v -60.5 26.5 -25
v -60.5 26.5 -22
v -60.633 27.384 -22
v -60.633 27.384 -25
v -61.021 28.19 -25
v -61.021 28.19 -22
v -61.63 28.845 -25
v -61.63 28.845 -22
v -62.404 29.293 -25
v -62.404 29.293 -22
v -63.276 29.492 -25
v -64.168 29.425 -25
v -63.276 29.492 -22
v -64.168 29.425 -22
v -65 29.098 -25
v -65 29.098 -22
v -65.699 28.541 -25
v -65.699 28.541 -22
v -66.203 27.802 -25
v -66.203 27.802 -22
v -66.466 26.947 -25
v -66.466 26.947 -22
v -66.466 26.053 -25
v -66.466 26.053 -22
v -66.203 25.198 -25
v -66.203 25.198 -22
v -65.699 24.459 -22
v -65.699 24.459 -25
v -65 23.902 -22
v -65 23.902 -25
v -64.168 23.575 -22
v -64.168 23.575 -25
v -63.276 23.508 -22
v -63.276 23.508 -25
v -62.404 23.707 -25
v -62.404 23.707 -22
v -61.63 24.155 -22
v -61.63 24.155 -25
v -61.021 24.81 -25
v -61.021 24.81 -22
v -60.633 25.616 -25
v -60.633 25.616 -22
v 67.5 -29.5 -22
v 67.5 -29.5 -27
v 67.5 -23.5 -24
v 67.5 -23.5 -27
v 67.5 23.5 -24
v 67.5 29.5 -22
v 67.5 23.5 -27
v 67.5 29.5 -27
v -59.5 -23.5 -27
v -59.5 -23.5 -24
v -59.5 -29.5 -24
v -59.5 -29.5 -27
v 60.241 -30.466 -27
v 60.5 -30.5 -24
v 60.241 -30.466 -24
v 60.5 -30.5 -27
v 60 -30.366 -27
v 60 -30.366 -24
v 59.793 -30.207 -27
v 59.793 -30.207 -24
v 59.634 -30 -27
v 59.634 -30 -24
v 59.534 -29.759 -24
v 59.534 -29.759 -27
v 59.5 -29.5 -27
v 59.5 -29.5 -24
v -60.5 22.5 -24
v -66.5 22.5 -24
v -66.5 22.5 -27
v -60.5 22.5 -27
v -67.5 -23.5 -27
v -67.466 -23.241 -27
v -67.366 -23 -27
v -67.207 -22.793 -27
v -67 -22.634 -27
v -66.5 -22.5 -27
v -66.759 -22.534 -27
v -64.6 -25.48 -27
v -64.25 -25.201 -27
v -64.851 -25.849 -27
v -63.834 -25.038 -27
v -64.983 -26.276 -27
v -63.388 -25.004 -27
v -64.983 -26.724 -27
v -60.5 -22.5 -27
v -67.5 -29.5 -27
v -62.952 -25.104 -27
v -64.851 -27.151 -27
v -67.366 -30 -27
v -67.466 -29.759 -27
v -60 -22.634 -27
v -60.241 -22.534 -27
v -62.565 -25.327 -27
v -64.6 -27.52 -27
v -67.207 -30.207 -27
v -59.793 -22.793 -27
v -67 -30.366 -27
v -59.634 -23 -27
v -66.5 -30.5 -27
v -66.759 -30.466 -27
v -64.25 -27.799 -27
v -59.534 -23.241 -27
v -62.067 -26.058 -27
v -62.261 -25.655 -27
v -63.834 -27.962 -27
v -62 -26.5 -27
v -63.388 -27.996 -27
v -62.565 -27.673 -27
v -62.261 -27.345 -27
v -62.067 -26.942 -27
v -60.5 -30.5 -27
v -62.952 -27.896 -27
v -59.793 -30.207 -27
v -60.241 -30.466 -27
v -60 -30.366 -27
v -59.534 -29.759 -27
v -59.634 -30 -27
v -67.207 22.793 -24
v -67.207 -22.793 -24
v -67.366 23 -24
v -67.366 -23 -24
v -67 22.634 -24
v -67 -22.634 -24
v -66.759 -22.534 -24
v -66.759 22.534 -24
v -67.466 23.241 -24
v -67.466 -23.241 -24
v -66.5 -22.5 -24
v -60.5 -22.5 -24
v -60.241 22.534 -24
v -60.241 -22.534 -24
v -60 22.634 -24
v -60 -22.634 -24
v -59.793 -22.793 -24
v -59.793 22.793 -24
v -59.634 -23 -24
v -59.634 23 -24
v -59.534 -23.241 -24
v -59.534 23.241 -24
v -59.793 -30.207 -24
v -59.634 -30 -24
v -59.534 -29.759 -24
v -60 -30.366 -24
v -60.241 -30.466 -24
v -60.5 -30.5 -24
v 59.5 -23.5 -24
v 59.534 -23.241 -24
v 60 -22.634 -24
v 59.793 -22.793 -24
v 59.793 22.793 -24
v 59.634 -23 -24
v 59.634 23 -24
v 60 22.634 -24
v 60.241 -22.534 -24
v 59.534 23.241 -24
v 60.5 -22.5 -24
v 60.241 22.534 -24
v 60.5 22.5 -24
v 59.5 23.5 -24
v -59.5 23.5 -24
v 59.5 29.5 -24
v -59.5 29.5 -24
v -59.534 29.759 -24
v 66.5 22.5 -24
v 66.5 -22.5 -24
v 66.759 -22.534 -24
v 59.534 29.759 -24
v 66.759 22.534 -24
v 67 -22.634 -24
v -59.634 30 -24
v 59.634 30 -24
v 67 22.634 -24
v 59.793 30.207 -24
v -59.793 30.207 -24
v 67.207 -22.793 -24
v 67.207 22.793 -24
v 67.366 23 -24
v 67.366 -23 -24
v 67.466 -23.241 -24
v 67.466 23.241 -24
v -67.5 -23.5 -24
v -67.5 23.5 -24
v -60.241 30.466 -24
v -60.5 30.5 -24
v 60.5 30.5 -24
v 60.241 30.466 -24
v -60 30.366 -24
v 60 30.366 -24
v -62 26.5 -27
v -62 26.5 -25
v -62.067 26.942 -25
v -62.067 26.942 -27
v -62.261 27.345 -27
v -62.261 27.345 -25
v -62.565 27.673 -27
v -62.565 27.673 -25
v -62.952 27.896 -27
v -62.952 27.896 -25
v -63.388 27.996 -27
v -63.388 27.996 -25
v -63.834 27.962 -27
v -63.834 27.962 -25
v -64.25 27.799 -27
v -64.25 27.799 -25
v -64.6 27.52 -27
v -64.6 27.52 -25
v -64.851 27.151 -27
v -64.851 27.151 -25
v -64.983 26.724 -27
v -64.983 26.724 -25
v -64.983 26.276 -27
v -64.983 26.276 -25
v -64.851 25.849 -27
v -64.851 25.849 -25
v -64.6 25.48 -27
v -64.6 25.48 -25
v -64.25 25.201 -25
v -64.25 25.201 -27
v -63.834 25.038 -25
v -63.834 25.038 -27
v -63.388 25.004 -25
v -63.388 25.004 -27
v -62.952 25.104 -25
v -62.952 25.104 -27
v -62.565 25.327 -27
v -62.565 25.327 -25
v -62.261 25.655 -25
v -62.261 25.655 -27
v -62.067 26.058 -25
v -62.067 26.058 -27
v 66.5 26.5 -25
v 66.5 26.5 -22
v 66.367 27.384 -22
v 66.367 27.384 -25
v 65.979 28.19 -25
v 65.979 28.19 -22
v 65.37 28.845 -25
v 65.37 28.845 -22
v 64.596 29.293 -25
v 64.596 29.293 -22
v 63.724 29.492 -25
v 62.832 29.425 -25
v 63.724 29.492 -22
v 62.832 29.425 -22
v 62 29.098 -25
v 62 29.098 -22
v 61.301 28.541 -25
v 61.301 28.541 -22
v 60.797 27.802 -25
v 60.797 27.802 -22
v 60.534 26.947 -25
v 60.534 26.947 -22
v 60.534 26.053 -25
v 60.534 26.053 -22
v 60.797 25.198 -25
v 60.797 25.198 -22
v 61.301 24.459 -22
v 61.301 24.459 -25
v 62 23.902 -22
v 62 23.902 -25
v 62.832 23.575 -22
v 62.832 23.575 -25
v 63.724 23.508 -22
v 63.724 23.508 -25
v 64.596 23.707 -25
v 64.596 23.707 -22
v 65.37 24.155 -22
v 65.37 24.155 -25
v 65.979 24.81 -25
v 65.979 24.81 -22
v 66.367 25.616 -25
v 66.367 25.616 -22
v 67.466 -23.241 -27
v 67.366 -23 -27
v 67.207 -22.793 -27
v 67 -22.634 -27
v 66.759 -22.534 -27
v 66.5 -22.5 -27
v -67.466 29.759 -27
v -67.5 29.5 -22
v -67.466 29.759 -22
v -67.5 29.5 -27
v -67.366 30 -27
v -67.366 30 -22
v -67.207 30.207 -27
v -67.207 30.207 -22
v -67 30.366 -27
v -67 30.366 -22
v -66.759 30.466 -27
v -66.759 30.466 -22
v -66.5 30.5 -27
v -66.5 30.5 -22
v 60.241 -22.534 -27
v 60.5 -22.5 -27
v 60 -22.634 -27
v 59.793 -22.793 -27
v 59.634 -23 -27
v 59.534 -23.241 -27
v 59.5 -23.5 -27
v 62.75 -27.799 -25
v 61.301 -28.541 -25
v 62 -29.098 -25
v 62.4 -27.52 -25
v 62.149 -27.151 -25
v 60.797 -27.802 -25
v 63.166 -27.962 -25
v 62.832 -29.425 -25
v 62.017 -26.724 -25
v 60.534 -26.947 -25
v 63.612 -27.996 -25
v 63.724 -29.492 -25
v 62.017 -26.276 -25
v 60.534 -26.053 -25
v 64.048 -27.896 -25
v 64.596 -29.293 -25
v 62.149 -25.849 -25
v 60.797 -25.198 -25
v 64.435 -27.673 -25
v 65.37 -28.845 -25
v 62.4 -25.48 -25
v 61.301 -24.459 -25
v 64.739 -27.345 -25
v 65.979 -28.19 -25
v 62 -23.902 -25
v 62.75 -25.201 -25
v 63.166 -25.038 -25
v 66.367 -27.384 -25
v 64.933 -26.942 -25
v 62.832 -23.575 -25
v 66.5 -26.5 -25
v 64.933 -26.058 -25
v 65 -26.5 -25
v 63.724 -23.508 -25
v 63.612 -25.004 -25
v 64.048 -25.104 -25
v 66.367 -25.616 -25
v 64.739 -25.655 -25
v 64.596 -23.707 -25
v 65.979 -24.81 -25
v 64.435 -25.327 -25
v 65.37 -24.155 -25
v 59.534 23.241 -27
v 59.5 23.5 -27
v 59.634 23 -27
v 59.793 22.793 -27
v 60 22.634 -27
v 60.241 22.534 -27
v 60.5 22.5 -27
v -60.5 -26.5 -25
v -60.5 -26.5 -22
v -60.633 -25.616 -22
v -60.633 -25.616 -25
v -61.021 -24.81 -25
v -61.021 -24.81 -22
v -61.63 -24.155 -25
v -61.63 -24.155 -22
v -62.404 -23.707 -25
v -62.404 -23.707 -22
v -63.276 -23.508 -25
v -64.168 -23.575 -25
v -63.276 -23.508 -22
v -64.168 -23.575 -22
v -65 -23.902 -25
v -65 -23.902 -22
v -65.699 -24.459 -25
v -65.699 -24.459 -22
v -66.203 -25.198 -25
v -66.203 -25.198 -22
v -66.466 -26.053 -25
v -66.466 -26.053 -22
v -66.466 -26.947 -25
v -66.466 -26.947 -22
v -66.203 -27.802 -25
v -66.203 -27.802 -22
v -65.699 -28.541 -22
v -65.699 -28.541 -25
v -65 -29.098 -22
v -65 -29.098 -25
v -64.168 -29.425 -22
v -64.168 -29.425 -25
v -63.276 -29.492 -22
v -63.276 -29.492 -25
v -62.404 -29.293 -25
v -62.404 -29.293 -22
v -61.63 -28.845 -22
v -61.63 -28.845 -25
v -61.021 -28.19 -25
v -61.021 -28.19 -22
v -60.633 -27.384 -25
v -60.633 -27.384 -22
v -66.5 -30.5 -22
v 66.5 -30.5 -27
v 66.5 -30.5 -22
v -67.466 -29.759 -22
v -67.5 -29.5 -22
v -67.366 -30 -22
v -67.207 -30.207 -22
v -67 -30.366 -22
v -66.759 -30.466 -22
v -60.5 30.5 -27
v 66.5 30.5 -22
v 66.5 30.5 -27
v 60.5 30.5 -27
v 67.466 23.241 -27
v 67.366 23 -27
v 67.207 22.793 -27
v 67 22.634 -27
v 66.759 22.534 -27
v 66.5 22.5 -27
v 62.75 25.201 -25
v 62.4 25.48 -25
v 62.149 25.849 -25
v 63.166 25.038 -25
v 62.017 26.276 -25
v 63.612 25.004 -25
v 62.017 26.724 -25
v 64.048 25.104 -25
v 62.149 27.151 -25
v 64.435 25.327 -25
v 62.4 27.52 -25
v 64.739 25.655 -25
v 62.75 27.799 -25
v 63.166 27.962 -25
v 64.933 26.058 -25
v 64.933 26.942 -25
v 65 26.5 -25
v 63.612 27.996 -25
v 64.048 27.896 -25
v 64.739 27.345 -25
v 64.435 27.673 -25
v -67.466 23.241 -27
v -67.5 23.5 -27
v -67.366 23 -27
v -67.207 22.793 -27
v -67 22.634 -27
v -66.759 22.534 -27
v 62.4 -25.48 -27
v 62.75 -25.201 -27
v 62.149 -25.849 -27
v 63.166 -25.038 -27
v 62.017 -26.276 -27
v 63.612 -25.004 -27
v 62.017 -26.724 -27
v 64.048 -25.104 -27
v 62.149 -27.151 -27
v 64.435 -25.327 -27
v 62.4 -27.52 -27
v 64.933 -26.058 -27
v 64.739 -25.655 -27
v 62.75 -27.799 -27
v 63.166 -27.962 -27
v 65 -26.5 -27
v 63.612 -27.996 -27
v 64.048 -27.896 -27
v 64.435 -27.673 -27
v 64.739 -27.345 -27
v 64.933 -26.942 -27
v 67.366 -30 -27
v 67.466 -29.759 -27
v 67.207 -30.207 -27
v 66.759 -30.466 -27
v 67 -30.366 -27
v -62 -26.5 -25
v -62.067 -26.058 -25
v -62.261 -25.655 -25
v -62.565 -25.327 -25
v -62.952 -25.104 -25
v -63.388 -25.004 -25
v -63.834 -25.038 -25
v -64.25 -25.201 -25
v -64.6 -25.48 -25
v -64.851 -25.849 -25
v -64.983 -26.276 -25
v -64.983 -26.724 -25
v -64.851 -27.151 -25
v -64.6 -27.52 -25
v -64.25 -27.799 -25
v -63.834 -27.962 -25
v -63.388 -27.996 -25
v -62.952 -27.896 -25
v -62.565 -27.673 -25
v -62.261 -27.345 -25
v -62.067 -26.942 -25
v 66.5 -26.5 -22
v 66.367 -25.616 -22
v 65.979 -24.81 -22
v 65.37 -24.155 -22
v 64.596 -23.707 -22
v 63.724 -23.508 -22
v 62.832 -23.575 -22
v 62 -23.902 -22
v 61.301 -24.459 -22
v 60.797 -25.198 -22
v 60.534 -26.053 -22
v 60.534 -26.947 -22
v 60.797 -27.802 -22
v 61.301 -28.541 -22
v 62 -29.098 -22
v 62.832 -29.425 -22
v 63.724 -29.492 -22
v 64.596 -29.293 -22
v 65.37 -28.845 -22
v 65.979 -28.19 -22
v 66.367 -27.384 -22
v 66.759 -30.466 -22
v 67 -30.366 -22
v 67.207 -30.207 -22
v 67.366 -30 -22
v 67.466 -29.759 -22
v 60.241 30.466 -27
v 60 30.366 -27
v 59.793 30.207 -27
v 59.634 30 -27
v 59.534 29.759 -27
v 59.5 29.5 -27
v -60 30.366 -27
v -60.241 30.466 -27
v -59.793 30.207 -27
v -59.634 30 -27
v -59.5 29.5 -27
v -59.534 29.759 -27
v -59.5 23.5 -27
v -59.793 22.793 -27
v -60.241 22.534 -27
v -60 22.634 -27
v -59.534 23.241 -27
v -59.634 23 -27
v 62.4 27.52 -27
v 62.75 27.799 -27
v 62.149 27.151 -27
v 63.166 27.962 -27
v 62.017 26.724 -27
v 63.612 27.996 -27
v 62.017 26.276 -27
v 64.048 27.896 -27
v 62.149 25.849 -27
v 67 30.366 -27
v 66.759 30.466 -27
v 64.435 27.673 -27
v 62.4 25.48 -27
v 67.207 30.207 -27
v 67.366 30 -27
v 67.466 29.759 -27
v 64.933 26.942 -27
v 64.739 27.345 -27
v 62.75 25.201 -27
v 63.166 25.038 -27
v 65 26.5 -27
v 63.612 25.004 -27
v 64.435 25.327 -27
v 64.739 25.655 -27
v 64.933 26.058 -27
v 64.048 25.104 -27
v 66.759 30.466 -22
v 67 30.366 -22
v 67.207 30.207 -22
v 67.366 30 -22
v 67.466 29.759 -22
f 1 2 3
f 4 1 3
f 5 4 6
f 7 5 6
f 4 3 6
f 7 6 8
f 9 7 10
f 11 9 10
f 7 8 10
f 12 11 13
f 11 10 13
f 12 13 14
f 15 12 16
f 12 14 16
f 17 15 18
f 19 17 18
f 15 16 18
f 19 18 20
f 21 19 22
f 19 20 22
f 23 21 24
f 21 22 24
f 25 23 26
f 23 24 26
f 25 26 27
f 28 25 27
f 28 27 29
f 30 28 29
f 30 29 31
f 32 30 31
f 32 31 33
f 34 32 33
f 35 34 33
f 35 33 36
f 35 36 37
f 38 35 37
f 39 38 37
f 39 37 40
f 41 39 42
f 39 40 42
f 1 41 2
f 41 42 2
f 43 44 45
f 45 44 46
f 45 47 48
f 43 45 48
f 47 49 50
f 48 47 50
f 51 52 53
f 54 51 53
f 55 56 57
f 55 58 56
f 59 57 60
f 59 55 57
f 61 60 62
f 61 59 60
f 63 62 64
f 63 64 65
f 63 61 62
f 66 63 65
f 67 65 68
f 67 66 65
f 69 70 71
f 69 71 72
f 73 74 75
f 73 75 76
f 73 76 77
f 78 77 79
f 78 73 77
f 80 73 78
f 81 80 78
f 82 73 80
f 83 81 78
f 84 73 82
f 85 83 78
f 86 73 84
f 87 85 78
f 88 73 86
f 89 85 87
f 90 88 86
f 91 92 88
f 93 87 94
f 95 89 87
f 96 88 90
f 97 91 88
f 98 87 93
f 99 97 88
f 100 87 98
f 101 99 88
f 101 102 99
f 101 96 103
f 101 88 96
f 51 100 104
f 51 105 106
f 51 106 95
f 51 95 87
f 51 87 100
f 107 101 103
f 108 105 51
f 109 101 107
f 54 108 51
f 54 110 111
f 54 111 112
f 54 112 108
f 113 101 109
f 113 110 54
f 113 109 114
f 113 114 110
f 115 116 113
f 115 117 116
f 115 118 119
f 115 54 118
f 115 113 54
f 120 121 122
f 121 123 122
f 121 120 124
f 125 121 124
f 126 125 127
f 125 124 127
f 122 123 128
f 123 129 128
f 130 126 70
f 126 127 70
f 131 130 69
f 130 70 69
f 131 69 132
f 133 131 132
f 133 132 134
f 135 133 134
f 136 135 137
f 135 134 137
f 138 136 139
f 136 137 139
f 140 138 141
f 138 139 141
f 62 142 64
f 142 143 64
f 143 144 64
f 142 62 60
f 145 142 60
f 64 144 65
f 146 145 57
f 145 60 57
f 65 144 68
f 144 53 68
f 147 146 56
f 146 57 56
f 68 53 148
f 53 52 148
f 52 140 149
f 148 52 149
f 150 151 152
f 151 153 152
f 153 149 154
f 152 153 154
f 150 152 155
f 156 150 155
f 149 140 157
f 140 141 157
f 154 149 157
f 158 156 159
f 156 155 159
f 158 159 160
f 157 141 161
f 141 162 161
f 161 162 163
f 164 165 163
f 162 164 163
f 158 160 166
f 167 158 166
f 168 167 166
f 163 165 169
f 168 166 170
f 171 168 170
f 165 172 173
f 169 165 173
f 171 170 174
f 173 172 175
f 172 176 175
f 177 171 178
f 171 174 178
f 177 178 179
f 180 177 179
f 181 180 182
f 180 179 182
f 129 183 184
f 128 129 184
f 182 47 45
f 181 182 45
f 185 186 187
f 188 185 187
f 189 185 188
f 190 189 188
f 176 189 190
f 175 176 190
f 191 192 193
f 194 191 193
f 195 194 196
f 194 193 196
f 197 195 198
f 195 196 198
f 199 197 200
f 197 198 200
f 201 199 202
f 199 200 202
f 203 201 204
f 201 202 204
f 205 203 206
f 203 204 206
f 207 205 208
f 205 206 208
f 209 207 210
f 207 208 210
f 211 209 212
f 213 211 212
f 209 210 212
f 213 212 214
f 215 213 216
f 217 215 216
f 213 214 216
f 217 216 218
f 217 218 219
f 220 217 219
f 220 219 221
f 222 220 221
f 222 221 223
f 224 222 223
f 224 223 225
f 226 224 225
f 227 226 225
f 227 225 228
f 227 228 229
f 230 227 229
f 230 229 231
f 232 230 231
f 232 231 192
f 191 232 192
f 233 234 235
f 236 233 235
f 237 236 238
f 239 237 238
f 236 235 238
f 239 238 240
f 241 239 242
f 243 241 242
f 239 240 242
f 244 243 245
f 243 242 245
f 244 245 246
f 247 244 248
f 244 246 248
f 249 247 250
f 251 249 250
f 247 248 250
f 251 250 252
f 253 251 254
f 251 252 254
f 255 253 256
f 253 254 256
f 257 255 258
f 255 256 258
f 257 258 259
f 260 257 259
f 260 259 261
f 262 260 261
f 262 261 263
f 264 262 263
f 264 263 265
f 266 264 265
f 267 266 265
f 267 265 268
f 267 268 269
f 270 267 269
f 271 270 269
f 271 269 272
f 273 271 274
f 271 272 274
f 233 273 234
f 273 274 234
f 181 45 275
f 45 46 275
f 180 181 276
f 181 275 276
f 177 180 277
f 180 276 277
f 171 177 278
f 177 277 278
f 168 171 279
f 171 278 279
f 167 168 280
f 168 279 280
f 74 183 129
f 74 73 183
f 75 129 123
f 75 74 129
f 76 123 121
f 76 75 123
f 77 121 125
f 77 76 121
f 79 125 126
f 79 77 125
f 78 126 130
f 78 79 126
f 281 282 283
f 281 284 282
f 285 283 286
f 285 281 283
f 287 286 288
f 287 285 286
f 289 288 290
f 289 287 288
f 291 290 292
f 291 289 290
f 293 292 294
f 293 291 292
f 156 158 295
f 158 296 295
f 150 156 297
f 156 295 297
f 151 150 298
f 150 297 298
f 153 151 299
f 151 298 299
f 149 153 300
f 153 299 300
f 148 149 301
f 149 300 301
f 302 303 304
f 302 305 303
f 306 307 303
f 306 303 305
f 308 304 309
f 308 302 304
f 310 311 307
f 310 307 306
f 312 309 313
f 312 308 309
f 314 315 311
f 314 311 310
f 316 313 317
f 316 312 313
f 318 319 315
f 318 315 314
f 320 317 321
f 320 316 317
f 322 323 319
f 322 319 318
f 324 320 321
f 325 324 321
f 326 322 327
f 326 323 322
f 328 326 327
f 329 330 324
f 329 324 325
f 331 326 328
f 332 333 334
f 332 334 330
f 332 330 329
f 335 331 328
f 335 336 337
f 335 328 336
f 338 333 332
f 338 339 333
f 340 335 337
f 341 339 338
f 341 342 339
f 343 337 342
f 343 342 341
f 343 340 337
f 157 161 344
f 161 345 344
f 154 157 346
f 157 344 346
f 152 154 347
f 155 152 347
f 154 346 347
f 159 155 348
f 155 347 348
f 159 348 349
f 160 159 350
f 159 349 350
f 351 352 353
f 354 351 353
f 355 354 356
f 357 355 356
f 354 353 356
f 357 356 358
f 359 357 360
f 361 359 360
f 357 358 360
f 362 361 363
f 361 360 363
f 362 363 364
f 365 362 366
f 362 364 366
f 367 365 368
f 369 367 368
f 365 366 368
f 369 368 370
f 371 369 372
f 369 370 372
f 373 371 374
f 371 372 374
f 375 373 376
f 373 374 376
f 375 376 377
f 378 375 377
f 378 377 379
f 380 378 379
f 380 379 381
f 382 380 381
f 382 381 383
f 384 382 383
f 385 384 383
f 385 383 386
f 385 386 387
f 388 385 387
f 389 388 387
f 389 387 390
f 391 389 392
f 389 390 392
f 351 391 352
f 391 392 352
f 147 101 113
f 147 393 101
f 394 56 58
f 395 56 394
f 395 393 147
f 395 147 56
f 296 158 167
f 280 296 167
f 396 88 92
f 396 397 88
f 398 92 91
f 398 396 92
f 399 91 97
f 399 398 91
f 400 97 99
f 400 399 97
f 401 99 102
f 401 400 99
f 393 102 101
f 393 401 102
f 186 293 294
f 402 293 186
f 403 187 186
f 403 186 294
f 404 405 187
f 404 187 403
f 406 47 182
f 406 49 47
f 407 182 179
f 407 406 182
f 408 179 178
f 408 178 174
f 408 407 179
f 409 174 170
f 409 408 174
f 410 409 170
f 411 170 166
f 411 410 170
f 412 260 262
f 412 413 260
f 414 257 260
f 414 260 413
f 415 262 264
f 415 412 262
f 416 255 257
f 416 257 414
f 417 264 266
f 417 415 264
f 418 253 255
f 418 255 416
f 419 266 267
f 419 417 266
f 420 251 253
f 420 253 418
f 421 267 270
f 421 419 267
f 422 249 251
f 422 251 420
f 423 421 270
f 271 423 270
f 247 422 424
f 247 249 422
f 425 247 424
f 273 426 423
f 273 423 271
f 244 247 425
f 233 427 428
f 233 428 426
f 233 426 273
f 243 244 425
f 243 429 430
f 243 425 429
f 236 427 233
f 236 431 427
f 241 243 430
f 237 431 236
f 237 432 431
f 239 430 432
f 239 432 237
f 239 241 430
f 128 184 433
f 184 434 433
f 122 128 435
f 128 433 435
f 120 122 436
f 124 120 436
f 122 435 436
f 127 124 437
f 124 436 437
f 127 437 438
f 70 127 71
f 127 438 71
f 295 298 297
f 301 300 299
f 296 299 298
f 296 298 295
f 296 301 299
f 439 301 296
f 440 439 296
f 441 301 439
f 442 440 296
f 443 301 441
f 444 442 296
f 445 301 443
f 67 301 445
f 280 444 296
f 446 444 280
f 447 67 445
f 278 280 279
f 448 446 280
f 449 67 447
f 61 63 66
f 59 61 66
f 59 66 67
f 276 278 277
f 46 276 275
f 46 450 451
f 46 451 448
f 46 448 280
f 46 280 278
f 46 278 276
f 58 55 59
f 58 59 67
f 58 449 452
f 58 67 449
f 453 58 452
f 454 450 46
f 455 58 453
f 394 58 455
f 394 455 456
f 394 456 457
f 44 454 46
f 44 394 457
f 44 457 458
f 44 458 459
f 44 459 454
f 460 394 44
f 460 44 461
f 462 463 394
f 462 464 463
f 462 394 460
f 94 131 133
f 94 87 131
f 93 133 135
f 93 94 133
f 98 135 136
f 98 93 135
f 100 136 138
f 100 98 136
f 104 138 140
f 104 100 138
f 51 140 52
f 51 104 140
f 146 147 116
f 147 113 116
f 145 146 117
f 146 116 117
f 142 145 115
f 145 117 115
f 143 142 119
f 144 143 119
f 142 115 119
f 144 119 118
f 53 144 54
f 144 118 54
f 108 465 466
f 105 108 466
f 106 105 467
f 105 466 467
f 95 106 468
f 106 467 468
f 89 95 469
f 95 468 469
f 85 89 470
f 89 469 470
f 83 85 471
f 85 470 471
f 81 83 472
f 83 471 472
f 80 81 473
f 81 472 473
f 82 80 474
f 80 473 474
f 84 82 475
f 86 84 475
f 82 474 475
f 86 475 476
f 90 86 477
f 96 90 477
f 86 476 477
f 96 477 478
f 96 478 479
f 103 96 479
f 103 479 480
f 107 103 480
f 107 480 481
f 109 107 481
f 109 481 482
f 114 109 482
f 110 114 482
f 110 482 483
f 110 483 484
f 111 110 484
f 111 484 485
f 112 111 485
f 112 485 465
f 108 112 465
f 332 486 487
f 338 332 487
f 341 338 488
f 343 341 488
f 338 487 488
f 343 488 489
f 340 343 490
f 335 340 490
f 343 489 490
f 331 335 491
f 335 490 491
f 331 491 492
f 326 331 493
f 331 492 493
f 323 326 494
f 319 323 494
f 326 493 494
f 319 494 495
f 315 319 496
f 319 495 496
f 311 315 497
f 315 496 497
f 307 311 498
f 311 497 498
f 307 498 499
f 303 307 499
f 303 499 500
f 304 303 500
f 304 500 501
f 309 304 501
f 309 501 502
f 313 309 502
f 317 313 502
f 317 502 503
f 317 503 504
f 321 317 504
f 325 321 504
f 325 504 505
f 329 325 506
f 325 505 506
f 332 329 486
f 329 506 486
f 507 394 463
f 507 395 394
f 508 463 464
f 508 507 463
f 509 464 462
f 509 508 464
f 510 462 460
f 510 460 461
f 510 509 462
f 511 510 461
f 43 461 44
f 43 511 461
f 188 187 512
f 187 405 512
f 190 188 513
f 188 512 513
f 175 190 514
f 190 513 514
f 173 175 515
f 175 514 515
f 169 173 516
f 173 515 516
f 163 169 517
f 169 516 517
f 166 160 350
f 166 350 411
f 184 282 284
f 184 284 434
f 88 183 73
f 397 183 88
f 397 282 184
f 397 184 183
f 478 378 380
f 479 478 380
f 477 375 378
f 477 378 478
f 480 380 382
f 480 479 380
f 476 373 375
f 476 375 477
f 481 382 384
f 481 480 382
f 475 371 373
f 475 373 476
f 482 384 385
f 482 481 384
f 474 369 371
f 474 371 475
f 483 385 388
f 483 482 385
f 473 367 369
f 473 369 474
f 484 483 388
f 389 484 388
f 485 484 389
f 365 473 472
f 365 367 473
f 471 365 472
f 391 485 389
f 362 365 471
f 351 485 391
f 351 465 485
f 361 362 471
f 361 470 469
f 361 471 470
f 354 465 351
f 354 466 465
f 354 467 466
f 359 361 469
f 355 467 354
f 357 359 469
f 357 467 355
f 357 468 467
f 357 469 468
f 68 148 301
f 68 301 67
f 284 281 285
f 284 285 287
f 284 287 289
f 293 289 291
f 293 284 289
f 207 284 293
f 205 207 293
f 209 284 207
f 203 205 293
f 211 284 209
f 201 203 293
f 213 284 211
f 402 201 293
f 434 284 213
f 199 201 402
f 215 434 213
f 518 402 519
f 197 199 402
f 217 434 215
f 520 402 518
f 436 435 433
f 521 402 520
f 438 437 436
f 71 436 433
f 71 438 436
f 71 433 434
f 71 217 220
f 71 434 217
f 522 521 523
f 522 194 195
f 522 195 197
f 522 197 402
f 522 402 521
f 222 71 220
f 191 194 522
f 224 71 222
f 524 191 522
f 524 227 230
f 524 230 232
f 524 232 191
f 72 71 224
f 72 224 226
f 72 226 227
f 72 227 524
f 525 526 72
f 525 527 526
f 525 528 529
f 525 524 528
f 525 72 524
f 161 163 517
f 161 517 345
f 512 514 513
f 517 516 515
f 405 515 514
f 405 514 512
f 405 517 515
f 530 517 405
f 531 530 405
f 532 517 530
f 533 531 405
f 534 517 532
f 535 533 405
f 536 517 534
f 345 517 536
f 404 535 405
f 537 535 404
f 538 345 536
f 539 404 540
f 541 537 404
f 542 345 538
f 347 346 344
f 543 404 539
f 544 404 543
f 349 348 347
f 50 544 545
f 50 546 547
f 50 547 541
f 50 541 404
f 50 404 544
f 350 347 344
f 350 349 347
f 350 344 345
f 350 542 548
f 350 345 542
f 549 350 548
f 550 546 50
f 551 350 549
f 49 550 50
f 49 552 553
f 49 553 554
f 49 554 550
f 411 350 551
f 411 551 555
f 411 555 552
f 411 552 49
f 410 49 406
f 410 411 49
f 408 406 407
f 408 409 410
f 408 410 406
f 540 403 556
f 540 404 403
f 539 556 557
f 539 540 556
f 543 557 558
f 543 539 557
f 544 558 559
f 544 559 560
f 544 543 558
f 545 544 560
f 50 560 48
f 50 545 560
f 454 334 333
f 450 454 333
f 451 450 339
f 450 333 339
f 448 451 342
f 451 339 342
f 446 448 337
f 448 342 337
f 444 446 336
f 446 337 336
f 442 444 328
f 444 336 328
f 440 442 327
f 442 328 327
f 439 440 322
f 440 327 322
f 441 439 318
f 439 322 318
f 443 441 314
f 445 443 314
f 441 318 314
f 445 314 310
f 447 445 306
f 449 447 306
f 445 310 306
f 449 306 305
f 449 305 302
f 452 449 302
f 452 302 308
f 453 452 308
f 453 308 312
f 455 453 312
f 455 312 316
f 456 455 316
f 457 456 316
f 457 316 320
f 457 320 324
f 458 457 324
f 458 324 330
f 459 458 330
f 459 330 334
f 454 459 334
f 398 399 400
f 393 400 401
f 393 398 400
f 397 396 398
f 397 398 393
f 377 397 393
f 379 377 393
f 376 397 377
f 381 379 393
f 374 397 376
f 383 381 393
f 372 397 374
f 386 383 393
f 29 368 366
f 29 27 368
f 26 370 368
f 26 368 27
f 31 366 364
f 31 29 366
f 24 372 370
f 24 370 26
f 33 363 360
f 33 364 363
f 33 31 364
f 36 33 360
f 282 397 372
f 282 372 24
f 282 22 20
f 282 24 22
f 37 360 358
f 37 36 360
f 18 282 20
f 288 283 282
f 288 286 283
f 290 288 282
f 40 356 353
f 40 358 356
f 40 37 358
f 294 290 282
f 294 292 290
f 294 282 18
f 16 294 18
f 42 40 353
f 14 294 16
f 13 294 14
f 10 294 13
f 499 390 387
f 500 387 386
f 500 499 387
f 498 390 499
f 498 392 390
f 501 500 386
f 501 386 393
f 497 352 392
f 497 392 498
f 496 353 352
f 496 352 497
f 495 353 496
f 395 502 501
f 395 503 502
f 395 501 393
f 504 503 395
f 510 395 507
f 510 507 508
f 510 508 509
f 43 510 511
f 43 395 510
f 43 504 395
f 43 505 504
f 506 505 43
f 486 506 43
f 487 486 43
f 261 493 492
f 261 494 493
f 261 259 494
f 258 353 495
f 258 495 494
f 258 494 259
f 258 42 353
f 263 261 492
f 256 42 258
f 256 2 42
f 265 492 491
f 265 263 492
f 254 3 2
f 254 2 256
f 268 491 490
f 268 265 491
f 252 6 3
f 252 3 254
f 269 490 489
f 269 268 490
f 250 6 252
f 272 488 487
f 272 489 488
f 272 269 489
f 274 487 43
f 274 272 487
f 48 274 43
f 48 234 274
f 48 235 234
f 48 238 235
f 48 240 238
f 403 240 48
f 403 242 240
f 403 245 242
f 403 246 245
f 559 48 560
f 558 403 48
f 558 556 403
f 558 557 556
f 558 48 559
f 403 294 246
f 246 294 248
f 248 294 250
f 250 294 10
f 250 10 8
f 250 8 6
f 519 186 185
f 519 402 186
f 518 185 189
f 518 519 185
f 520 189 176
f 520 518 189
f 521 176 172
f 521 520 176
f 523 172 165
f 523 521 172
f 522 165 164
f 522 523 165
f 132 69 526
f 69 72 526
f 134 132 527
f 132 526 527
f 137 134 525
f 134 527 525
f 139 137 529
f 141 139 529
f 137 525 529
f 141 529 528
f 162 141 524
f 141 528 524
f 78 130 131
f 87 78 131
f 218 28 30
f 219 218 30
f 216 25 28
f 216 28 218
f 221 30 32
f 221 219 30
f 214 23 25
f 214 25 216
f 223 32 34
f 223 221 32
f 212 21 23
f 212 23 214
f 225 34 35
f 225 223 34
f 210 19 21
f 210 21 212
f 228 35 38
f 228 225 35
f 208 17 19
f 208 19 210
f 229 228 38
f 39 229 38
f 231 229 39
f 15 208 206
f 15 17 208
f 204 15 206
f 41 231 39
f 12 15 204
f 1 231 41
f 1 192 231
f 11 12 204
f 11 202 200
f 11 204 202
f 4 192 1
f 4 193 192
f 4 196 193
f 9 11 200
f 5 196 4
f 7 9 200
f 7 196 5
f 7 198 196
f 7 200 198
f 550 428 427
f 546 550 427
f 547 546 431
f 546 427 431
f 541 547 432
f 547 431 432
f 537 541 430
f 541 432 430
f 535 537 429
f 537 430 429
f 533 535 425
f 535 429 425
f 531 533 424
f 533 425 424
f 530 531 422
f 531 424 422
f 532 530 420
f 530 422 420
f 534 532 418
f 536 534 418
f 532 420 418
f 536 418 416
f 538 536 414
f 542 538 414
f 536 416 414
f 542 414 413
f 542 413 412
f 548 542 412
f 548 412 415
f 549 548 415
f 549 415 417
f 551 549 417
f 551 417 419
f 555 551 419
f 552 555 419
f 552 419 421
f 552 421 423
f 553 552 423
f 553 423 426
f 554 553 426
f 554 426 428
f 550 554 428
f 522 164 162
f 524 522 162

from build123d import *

# Parameters (mm, degrees)
SKETCH010_W     = 135
SKETCH010_H     = 61
PAD007_DEPTH    = 2
SKETCH011_W     = 8
SKETCH011_H     = 8
PAD008_DEPTH    = 3
SKETCH012_R     = 1.5
POCKET003_DEPTH = 5
SKETCH013_R     = 3
POCKET004_DEPTH = 3
FILLET002_R     = 1
FILLET003_R     = 1


with BuildPart() as part:
    # Sketch010 → Pad007 (new body)
    with BuildSketch(Plane.XY):
        Rectangle(SKETCH010_W, SKETCH010_H)
    extrude(amount=PAD007_DEPTH)

    # Sketch011 (on Face5 of Pad007) → Pad008 (join)
    with BuildSketch(Plane(origin=(0, 0, 0), x_dir=(1, 0, 0), z_dir=(0, 0, -1))):
        with Locations((-63.5, 26.5)):
            Rectangle(SKETCH011_W, SKETCH011_H)
        with Locations((-63.5, -26.5)):
            Rectangle(SKETCH011_W, SKETCH011_H)
        with Locations((63.5, -26.5)):
            Rectangle(SKETCH011_W, SKETCH011_H)
        with Locations((63.5, 26.5)):
            Rectangle(SKETCH011_W, SKETCH011_H)
    extrude(amount=PAD008_DEPTH)

    # Sketch012 (on Face15 of Pad008) → Pocket003 (cut)
    with BuildSketch(Plane.XY.offset(2)):
        with Locations((-63.5, 26.5)):
            Circle(SKETCH012_R)
        with Locations((-63.5, -26.5)):
            Circle(SKETCH012_R)
        with Locations((63.5, 26.5)):
            Circle(SKETCH012_R)
        with Locations((63.5, -26.5)):
            Circle(SKETCH012_R)
    extrude(amount=-POCKET003_DEPTH, mode=Mode.SUBTRACT)

    # Sketch013 (on Face16 of Pocket003) → Pocket004 (cut)
    with BuildSketch(Plane.XY.offset(2)):
        with Locations((-63.5, 26.5)):
            Circle(SKETCH013_R)
        with Locations((-63.5, -26.5)):
            Circle(SKETCH013_R)
        with Locations((63.5, -26.5)):
            Circle(SKETCH013_R)
        with Locations((63.5, 26.5)):
            Circle(SKETCH013_R)
    extrude(amount=-POCKET004_DEPTH, mode=Mode.SUBTRACT)

    # Fillet002
    fillet002_edges = [part.edges().sort_by_distance(p)[0] for p in [
        (67.5, -30.5, -0.5),
        (-67.5, -30.5, -0.5),
        (-67.5, 30.5, -0.5),
        (67.5, 30.5, -0.5),
    ]]
    fillet(fillet002_edges, radius=FILLET002_R)

    # Fillet003
    fillet003_edges = [part.edges().sort_by_distance(p)[0] for p in [
        (59.5, -22.5, -1.5),
        (59.5, 22.5, -1.5),
        (-59.5, 22.5, -1.5),
        (-59.5, -22.5, -1.5),
        (67.5, 22.5, -1.5),
        (59.5, 30.5, -1.5),
        (67.5, -22.5, -1.5),
        (59.5, -30.5, -1.5),
        (-59.5, -30.5, -1.5),
        (-67.5, -22.5, -1.5),
        (-67.5, 22.5, -1.5),
        (-59.5, 30.5, -1.5),
    ]]
    fillet(fillet003_edges, radius=FILLET003_R)


with BuildPart() as part_1:
    # Body002 placement: moved
    add(part.part.moved(Location((0, 0, -24))))


solid = part_1.part
